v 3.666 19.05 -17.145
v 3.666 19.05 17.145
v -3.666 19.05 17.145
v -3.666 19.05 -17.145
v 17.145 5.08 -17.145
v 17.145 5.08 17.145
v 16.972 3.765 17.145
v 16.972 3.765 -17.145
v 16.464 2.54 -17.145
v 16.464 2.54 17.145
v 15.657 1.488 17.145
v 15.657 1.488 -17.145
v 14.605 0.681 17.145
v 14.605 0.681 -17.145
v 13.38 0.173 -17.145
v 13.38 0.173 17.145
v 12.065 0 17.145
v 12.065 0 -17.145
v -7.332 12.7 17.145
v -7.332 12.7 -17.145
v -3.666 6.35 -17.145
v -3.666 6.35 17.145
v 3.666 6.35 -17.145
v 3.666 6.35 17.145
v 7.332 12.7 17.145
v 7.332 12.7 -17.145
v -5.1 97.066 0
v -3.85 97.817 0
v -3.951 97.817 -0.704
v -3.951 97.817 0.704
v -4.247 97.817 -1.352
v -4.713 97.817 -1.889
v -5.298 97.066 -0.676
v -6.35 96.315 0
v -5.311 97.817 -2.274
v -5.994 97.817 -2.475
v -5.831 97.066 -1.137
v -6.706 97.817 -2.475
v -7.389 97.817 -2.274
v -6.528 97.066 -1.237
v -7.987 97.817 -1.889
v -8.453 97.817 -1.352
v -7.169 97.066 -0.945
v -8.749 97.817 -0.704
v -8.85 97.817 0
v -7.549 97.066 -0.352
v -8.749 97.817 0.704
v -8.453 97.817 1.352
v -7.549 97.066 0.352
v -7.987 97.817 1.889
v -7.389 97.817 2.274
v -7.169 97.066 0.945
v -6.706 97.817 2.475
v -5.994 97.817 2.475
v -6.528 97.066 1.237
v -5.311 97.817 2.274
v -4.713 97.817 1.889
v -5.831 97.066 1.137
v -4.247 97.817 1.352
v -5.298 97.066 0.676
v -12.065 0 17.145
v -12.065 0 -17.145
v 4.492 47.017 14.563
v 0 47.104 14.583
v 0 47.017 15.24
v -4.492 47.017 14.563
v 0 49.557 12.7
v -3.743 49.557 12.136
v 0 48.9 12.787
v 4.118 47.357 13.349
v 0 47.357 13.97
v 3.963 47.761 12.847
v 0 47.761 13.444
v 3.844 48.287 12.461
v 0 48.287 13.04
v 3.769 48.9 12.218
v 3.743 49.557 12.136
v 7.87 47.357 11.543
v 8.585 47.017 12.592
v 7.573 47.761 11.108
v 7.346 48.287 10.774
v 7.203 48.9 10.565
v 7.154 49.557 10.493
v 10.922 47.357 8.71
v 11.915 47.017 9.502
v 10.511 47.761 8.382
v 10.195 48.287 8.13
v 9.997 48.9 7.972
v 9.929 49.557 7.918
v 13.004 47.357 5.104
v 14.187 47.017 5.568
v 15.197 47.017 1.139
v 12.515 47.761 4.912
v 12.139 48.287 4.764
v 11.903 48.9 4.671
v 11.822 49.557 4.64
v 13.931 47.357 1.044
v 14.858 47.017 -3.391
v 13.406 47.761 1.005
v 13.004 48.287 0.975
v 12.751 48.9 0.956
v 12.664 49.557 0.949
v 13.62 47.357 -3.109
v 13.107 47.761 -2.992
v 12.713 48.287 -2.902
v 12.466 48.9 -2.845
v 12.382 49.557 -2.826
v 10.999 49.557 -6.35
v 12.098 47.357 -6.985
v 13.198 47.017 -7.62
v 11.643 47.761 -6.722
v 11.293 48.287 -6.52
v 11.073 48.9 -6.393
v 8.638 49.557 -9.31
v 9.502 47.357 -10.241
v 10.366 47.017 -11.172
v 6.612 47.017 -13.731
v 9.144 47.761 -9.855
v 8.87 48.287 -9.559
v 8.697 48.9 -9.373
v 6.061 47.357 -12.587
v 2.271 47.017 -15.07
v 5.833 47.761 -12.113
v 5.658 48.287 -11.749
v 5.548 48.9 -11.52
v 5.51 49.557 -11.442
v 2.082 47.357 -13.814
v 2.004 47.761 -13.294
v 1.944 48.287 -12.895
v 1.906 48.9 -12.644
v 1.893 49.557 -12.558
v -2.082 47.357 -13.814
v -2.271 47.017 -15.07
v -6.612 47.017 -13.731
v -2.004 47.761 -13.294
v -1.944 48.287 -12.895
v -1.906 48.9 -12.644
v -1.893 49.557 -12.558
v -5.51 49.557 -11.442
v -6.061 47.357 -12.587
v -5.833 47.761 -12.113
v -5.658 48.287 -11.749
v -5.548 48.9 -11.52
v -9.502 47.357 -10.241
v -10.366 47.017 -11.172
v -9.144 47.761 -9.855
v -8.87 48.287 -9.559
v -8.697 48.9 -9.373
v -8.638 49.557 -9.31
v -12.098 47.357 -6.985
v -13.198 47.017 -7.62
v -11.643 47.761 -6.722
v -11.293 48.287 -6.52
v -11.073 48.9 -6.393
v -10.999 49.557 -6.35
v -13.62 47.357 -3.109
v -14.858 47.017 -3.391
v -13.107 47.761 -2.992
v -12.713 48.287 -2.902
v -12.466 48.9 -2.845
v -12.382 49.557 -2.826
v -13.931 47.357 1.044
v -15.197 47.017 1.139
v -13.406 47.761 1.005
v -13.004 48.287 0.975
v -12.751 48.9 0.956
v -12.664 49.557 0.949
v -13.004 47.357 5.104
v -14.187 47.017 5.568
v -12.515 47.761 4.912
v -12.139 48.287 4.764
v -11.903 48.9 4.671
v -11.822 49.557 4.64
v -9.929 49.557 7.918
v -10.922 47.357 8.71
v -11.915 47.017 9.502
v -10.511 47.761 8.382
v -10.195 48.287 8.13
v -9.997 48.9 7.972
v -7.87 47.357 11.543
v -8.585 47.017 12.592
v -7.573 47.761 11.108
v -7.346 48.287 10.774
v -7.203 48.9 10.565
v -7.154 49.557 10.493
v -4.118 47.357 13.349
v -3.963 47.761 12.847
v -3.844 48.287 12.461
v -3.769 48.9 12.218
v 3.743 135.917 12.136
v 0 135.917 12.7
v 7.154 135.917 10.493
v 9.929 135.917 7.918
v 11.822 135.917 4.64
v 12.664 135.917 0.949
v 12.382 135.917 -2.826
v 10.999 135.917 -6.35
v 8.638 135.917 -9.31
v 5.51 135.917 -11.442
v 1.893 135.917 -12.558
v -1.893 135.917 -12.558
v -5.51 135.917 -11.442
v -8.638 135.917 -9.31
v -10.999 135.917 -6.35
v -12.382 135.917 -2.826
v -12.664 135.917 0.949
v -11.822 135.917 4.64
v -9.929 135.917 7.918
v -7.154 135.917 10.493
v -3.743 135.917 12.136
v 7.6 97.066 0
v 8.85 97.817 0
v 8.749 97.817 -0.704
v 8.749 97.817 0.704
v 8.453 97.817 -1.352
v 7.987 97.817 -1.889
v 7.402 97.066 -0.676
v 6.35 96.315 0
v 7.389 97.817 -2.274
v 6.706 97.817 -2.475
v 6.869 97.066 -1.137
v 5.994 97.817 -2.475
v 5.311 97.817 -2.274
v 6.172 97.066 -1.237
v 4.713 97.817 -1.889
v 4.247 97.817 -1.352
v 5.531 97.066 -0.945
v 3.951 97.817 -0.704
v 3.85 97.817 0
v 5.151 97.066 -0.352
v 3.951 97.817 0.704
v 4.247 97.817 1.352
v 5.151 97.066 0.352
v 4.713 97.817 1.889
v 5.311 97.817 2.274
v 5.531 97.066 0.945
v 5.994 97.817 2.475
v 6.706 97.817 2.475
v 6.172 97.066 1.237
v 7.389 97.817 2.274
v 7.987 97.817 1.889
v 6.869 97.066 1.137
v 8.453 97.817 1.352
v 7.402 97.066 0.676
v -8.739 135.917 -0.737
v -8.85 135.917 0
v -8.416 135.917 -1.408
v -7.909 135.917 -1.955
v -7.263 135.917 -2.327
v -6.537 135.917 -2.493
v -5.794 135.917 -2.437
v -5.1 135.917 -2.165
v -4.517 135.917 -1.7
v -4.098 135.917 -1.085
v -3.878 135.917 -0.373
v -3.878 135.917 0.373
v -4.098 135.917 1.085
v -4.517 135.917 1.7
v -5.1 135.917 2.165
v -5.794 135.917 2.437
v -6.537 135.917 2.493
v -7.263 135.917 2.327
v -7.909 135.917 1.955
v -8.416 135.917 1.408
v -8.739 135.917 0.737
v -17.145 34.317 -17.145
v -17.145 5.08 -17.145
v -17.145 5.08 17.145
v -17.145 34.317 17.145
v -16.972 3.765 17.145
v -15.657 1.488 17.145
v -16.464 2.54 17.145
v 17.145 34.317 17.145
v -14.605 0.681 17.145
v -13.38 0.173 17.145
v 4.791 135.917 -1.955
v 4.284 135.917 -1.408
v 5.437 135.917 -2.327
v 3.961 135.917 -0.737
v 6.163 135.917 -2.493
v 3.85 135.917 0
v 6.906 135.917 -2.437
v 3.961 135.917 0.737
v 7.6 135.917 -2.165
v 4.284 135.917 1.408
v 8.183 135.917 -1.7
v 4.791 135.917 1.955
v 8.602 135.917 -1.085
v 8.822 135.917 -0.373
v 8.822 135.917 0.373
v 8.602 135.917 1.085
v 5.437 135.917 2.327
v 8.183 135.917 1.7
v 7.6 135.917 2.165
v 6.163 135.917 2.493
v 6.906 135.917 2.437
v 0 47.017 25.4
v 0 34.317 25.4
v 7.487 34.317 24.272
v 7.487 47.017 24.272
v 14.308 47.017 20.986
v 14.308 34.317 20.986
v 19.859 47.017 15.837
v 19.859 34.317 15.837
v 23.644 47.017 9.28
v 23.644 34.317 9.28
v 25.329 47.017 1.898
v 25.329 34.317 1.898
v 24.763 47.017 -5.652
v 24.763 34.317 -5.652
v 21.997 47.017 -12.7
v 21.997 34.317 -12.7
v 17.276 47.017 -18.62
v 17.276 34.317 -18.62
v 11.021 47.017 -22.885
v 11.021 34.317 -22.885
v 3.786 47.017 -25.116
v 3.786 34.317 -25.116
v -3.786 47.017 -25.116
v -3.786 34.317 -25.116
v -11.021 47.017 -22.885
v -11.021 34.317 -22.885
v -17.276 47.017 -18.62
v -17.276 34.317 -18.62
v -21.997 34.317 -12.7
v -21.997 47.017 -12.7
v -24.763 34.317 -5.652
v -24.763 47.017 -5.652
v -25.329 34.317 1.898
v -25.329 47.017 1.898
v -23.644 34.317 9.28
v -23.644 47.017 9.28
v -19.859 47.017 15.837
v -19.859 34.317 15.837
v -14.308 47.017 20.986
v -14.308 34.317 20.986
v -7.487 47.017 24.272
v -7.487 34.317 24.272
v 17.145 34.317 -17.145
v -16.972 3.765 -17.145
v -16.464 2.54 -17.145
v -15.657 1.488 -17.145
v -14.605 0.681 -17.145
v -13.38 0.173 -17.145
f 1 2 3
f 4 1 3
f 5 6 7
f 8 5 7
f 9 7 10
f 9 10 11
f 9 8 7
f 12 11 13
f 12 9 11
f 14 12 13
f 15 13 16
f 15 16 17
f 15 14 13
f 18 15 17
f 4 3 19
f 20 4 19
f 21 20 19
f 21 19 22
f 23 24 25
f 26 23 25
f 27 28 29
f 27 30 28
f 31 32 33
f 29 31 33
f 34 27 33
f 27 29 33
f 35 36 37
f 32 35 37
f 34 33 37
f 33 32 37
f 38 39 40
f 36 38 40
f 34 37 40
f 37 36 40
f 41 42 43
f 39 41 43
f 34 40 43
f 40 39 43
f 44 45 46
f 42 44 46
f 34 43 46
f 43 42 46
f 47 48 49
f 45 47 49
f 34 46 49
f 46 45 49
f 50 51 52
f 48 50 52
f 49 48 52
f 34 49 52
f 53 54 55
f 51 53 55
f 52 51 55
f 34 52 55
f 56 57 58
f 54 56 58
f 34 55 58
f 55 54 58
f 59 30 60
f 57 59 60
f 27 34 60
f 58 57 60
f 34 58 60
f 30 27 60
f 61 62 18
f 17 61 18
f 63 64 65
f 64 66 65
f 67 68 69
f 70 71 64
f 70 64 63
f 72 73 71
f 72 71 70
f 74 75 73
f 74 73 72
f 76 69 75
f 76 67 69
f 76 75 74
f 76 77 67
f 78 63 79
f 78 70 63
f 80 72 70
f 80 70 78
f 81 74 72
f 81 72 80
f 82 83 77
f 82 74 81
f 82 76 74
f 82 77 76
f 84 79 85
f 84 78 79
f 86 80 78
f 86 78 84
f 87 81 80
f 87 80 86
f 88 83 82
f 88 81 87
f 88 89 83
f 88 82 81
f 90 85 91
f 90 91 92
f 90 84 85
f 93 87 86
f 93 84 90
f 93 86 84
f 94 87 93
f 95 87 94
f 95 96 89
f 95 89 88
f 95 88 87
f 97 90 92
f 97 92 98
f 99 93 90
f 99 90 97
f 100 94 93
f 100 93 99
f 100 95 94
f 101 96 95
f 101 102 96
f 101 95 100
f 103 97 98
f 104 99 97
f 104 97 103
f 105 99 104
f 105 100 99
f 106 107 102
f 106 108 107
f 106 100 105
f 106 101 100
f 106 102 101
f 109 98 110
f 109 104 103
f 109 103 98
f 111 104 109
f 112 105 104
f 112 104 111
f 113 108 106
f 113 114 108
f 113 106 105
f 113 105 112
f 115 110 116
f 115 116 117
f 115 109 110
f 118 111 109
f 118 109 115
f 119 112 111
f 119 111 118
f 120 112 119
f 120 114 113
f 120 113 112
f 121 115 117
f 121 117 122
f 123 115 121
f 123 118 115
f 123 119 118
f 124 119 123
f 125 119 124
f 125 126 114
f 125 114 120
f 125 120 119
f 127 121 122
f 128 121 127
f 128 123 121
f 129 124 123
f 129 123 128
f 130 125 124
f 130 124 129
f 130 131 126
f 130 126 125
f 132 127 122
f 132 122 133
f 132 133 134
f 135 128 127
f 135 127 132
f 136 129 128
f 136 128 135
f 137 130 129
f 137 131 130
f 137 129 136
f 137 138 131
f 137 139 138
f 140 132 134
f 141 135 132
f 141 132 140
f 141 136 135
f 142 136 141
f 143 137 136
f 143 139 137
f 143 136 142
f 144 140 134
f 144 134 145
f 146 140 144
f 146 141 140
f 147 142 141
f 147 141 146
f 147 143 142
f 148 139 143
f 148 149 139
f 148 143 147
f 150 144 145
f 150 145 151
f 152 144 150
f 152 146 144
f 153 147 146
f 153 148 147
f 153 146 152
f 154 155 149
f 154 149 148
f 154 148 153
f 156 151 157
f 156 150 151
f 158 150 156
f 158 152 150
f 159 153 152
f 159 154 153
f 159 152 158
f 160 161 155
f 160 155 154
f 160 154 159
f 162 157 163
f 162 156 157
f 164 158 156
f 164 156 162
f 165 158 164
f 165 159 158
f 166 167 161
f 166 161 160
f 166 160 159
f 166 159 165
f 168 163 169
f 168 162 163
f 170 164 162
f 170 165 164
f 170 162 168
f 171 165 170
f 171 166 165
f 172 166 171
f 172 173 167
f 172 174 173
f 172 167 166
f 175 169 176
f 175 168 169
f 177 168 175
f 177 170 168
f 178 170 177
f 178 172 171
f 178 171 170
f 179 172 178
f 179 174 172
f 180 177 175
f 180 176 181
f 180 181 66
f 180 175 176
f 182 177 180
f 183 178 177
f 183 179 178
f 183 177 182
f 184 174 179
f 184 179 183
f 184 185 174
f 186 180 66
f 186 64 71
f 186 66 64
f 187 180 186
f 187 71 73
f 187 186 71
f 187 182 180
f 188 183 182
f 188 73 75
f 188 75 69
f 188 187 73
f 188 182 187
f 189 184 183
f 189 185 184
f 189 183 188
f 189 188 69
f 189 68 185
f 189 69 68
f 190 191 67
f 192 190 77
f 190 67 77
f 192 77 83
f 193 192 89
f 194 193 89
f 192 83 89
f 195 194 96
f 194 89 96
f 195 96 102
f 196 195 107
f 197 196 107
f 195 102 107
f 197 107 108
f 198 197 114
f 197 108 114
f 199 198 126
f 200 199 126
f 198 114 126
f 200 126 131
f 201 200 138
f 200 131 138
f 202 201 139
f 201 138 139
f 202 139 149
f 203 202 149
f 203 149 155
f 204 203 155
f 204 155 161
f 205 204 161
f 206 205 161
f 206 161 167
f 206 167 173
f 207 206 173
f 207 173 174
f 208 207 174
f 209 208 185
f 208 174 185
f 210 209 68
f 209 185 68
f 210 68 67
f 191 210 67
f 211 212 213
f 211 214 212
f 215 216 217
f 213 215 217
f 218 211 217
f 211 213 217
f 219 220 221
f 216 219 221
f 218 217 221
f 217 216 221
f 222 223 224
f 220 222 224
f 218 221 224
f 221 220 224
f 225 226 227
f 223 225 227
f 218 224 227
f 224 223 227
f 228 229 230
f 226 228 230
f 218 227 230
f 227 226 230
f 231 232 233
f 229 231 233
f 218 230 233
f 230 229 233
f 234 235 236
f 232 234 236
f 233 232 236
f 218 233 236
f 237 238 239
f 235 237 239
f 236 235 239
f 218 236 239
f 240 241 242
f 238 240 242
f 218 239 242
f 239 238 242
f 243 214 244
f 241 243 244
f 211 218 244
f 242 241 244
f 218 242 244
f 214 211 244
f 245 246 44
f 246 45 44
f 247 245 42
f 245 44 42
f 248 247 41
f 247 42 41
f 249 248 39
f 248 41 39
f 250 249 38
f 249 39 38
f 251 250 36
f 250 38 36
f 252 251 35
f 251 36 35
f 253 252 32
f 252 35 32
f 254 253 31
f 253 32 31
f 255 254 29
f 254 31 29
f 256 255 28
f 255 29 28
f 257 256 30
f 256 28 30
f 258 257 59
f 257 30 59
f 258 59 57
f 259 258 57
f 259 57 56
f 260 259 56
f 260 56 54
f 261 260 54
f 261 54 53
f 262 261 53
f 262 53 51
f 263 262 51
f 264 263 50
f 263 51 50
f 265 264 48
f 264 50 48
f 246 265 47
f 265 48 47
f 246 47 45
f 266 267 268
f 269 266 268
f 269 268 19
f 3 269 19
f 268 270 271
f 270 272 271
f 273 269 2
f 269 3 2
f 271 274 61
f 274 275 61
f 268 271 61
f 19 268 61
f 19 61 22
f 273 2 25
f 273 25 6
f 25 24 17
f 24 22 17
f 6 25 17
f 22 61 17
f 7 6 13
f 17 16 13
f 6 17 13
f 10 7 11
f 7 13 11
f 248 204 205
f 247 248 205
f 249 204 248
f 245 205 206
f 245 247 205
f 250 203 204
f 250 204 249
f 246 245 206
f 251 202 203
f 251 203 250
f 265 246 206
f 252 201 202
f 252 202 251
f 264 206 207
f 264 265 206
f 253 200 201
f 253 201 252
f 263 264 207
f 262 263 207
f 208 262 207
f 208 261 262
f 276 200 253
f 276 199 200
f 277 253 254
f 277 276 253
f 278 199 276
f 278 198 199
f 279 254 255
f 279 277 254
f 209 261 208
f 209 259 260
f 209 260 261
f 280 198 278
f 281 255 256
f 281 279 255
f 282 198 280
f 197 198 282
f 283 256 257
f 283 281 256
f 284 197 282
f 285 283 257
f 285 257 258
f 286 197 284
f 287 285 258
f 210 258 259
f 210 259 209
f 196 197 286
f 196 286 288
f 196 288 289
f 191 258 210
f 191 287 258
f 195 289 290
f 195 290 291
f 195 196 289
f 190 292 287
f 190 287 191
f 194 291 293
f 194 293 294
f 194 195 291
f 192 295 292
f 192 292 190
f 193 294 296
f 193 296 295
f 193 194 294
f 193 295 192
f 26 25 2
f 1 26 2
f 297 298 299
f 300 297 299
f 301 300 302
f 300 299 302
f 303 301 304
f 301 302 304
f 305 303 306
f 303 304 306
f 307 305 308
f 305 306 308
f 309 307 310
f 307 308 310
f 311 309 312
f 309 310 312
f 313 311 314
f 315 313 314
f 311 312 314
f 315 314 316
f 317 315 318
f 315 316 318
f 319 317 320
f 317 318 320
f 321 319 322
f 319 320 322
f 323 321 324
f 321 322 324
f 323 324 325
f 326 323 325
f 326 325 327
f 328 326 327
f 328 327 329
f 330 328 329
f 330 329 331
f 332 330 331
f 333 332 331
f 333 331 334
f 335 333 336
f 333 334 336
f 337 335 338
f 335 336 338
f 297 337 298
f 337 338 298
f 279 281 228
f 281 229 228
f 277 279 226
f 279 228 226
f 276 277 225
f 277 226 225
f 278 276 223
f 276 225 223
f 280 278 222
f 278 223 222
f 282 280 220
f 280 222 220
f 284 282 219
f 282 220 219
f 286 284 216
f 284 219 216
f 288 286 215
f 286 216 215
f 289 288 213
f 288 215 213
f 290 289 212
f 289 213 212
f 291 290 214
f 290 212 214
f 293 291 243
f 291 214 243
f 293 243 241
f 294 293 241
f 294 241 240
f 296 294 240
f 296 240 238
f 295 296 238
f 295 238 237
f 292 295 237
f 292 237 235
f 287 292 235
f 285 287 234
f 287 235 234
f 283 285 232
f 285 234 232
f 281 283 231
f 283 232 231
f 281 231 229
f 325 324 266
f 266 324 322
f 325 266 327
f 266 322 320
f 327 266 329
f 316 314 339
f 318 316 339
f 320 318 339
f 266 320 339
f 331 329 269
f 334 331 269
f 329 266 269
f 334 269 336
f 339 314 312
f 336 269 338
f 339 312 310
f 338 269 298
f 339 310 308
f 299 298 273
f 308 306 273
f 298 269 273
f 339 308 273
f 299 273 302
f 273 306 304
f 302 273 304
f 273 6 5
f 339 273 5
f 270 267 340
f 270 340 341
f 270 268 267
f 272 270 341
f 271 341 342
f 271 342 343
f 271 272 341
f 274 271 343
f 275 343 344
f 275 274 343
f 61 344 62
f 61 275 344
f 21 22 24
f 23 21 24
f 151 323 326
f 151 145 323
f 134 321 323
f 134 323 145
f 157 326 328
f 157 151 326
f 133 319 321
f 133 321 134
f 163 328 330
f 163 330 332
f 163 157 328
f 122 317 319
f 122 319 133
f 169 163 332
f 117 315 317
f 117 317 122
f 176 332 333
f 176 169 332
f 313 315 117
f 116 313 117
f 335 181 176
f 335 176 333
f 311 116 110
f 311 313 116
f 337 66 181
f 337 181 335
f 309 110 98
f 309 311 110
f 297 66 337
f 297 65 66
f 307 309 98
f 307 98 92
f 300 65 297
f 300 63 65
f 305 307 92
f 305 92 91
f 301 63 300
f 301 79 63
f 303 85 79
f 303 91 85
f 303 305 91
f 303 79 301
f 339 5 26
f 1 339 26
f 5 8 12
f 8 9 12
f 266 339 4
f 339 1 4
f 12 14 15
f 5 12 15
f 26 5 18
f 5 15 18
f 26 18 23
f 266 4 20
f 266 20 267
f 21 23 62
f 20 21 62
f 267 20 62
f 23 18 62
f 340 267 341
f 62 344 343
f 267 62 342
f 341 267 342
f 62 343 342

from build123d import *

# Parameters (mm, degrees)
BOSS_EXTRUDE1_DEPTH       = 34.31697226
SKETCH4_R                 = 25.4
BOSS_EXTRUDE2_DEPTH       = 12.7
SKETCH6_R                 = 12.7
BOSS_EXTRUDE3_DEPTH       = 88.9
CUT_EXTRUDE1_DEPTH        = 145.667412963
FILLET1_R                 = 5.08
FILLET2_R                 = 2.54
M6X1_0_TAPPED_HOLE1_D     = 5
M6X1_0_TAPPED_HOLE1_DEPTH = 38.1
M6X1_0_TAPPED_HOLE1_TIP   = 1.502151548


with BuildPart() as part:
    # Sketch3 → Boss-Extrude1 (new body)
    with BuildSketch(Plane(origin=(0, 0, 0), x_dir=(1, 0, 0), z_dir=(0, 1, 0))):
        Polygon((17.145, 0), (17.145, 17.145), (0, 17.145), (-17.145, 17.145), (-17.145, 0), (-17.145, -17.145), (0, -17.145), (17.145, -17.145), align=None)
    extrude(amount=BOSS_EXTRUDE1_DEPTH)

    # Sketch4 → Boss-Extrude2 (add)
    with BuildSketch(Plane(origin=(0, 34.31697226, 0), x_dir=(1, 0, 0), z_dir=(0, 1, 0))):
        with Locations(Location((0, 0, 0), (0, 0, 270))):
            Circle(SKETCH4_R)
    extrude(amount=BOSS_EXTRUDE2_DEPTH)

    # Sketch6 → Boss-Extrude3 (add)
    with BuildSketch(Plane(origin=(0, 47.01697226, 0), x_dir=(1, 0, 0), z_dir=(0, 1, 0))):
        with Locations(Location((0, 0, 0), (0, 0, 270))):
            Circle(SKETCH6_R)
    extrude(amount=BOSS_EXTRUDE3_DEPTH)

    # Sketch7 → Cut-Extrude1 (cut, through all)
    with BuildSketch(Plane.XY.offset(17.145)):
        Polygon((7.332348419, 12.7), (3.666174209, 19.05), (-3.666174209, 19.05), (-7.332348419, 12.7), (-3.666174209, 6.35), (3.666174209, 6.35), align=None)
    extrude(amount=-CUT_EXTRUDE1_DEPTH, mode=Mode.SUBTRACT)

    # Fillet1
    fillet1_edges = [part.edges().sort_by_distance(p)[0] for p in [
        (17.145, 0, 0),
        (-17.145, 0, 0),
    ]]
    fillet(fillet1_edges, radius=FILLET1_R)

    # Fillet2
    fillet2_edges = [part.edges().sort_by_distance(p)[0] for p in [
        (0, 47.01697226, -12.7),
    ]]
    fillet(fillet2_edges, radius=FILLET2_R)

    # M6x1.0 Tapped Hole1
    with Locations(Plane(origin=(0, 135.91697226, 0), x_dir=(1, 0, 0), z_dir=(0, 1, 0))):
        with Locations((6.35, 0), (-6.35, 0)):
            Hole(M6X1_0_TAPPED_HOLE1_D / 2, depth=M6X1_0_TAPPED_HOLE1_DEPTH)
            with Locations((0, 0, -(M6X1_0_TAPPED_HOLE1_DEPTH + M6X1_0_TAPPED_HOLE1_TIP / 2))):  # 118° drill point
                Cone(0, M6X1_0_TAPPED_HOLE1_D / 2, M6X1_0_TAPPED_HOLE1_TIP, mode=Mode.SUBTRACT)


solid = part.part
